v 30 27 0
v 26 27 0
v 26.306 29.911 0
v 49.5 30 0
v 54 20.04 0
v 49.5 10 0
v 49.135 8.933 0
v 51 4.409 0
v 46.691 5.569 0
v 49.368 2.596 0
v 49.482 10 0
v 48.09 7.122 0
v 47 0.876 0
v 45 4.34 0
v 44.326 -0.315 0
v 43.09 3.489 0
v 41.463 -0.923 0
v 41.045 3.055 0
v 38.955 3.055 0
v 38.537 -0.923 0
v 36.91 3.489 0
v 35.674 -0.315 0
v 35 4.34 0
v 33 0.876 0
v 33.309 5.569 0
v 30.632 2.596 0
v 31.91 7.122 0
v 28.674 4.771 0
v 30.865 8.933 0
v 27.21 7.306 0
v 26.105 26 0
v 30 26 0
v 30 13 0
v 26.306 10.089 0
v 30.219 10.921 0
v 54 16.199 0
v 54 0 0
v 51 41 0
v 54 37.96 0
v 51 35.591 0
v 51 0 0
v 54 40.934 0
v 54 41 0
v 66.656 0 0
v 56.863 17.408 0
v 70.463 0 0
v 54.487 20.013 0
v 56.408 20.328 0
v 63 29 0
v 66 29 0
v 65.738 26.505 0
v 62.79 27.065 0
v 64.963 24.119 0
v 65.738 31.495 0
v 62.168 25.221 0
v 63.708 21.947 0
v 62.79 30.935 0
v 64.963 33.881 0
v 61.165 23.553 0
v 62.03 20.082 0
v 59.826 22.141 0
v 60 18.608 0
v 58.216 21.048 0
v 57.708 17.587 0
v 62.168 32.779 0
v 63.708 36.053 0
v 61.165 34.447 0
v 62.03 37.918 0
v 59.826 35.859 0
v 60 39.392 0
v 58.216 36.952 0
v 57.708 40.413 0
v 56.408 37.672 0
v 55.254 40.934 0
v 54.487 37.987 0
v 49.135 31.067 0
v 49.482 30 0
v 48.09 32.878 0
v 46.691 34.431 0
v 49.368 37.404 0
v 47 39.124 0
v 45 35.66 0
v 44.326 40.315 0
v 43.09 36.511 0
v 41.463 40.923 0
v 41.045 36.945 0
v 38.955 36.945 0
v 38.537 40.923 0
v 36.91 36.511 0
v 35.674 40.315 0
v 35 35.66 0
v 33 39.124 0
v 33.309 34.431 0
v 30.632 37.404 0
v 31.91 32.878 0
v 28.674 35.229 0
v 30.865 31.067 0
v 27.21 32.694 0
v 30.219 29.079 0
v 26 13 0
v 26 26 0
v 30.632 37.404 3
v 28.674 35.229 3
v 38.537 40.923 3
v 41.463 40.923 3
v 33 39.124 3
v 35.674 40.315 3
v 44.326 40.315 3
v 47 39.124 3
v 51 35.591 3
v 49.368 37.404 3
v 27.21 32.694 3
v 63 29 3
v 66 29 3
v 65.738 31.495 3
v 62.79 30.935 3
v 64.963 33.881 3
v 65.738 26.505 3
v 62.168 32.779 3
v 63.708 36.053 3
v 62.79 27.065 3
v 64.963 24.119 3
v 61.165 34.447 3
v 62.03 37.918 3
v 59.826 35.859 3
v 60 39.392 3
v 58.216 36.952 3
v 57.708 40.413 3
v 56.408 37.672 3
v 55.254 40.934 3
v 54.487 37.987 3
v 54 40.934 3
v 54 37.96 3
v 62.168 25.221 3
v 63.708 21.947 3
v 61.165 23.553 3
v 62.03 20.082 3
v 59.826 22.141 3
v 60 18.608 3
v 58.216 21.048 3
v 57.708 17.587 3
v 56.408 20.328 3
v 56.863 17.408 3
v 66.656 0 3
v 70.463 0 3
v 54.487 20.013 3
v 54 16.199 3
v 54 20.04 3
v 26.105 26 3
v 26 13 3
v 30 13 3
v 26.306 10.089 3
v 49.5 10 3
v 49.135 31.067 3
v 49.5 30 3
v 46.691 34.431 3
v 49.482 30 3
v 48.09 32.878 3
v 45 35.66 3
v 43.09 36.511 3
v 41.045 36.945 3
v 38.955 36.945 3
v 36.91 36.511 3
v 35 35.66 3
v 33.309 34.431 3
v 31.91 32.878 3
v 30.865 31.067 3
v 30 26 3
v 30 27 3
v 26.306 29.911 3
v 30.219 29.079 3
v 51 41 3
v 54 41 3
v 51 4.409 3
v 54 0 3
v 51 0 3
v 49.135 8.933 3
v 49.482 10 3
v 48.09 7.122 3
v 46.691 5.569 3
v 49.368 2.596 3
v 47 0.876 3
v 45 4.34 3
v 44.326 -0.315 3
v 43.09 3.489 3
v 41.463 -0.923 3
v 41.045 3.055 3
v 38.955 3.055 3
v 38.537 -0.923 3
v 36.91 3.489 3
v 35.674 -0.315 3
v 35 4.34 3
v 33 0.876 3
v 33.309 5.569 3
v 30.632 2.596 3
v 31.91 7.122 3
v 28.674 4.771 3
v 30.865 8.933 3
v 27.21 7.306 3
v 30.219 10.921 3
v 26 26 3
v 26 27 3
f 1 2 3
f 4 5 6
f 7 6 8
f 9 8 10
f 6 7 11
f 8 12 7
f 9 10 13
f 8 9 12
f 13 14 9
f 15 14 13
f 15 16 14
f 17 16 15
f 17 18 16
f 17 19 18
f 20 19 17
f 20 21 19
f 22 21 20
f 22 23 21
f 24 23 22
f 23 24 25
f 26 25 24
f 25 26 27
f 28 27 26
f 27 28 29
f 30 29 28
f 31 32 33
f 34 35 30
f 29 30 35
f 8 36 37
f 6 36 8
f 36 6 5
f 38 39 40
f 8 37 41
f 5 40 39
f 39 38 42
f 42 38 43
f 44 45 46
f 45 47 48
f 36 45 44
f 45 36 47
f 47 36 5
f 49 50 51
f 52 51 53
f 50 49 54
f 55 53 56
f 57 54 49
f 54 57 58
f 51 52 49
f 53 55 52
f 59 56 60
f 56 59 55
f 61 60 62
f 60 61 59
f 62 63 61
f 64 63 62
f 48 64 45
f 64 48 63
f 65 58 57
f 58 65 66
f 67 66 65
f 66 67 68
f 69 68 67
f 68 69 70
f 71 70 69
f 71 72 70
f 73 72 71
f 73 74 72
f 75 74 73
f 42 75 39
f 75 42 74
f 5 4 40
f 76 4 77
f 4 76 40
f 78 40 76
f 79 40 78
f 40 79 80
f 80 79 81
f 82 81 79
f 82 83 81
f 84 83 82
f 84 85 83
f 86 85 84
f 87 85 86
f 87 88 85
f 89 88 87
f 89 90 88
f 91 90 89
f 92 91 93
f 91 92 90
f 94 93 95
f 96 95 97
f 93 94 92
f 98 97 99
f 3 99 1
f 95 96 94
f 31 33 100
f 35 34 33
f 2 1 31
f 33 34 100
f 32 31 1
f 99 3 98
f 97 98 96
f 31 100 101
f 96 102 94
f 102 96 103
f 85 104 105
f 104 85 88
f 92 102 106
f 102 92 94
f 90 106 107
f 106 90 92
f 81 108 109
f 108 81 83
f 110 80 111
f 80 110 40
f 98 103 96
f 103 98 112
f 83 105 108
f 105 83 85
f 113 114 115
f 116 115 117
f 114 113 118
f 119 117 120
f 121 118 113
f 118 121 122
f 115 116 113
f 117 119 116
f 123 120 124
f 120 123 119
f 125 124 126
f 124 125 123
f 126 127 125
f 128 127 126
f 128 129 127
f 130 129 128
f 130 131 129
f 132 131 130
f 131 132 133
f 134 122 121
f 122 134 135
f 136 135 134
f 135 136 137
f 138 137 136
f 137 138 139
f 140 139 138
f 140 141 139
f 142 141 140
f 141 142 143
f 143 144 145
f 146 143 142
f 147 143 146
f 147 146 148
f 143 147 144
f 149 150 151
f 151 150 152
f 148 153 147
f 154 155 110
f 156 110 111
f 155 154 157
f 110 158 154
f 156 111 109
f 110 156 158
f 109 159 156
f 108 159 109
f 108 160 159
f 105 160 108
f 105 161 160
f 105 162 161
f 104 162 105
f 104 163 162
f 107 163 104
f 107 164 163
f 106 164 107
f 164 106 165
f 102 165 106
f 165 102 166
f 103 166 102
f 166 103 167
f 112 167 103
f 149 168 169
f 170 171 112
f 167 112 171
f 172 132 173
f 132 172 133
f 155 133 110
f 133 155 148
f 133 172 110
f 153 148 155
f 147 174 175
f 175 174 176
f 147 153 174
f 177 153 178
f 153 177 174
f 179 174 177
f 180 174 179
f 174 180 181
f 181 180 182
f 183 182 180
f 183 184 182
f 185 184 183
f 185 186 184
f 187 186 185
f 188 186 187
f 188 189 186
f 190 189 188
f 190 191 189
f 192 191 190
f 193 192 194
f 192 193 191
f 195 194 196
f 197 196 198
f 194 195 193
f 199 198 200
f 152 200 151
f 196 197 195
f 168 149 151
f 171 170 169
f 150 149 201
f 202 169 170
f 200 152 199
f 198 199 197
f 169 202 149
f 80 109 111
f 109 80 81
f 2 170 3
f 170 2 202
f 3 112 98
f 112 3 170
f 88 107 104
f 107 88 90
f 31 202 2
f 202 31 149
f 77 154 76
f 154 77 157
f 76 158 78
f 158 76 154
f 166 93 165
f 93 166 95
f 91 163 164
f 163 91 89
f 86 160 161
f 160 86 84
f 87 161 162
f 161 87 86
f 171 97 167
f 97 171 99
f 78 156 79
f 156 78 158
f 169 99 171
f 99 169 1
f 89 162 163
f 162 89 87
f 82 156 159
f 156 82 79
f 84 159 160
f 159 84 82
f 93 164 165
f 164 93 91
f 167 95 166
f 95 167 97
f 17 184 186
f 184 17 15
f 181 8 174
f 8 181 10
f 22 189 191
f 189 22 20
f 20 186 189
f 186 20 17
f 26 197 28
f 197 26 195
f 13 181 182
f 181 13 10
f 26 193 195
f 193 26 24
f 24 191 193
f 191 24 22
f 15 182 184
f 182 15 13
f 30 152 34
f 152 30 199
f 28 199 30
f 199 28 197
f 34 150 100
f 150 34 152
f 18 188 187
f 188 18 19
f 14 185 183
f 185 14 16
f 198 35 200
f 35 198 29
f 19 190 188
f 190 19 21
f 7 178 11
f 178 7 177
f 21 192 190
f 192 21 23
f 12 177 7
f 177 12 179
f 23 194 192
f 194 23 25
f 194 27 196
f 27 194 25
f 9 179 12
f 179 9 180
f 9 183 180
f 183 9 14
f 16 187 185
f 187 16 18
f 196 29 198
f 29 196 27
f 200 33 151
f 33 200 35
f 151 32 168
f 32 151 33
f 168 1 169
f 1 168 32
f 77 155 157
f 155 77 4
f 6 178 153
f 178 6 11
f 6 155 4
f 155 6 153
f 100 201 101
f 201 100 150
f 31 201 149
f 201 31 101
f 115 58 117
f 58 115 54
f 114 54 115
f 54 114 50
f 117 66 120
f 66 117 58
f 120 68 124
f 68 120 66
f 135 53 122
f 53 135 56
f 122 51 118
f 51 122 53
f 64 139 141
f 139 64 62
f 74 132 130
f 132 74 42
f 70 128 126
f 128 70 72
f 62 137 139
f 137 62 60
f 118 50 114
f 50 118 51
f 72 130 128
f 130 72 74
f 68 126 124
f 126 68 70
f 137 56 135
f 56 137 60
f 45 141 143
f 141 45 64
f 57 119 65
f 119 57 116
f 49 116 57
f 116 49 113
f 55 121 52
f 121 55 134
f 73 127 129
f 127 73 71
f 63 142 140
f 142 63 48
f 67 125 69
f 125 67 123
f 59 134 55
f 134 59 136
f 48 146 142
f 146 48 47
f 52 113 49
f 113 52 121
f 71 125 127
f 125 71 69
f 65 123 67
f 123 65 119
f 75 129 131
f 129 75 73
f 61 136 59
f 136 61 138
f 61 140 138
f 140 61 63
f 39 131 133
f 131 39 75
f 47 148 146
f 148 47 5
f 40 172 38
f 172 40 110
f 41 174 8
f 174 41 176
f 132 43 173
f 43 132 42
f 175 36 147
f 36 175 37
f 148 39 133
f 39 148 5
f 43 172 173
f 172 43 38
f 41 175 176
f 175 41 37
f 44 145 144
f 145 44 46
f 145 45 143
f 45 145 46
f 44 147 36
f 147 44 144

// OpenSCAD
// буква О

union(){
  translate([49.5,10,0]) cube([4,20,3]);
  translate([26,13,0]) cube([4,13,3]);
difference(){
union(){
	
  difference(){
  translate([40,27,0]) cylinder(3,14,14);
  translate([40,27,-1]) cylinder(5,10,10);
  translate([33,10,-1]) cube([20,10,5]);

}

difference(){
  translate([40,13,0]) cylinder(3,14,14);
  translate([40,13,-1]) cylinder(5,10,10);
  translate([32,17,-1]) cube([19,10,5]);
  translate([40,17,-1]) cube(20);
}
}
  translate([30,13,-1]) cube([5,14,5]);
  translate([42,10,-1]) cube(20);
}
}

//R
translate([51,0,0])
union(){
difference(){
  union(){
  cube([3,41,3]);
difference(){
  translate([3,29,0]) cylinder(3,12,12);
  translate([3,29,-1]) cylinder(5,9,9);
  translate([-15,5,-1]) cube([15,40,5]);
}
translate([18,-3,0]) rotate([0,0,38]) cube([3,26,3]);
}
  translate([0,-13,-1]) cube([40,13,5]);

}
}
